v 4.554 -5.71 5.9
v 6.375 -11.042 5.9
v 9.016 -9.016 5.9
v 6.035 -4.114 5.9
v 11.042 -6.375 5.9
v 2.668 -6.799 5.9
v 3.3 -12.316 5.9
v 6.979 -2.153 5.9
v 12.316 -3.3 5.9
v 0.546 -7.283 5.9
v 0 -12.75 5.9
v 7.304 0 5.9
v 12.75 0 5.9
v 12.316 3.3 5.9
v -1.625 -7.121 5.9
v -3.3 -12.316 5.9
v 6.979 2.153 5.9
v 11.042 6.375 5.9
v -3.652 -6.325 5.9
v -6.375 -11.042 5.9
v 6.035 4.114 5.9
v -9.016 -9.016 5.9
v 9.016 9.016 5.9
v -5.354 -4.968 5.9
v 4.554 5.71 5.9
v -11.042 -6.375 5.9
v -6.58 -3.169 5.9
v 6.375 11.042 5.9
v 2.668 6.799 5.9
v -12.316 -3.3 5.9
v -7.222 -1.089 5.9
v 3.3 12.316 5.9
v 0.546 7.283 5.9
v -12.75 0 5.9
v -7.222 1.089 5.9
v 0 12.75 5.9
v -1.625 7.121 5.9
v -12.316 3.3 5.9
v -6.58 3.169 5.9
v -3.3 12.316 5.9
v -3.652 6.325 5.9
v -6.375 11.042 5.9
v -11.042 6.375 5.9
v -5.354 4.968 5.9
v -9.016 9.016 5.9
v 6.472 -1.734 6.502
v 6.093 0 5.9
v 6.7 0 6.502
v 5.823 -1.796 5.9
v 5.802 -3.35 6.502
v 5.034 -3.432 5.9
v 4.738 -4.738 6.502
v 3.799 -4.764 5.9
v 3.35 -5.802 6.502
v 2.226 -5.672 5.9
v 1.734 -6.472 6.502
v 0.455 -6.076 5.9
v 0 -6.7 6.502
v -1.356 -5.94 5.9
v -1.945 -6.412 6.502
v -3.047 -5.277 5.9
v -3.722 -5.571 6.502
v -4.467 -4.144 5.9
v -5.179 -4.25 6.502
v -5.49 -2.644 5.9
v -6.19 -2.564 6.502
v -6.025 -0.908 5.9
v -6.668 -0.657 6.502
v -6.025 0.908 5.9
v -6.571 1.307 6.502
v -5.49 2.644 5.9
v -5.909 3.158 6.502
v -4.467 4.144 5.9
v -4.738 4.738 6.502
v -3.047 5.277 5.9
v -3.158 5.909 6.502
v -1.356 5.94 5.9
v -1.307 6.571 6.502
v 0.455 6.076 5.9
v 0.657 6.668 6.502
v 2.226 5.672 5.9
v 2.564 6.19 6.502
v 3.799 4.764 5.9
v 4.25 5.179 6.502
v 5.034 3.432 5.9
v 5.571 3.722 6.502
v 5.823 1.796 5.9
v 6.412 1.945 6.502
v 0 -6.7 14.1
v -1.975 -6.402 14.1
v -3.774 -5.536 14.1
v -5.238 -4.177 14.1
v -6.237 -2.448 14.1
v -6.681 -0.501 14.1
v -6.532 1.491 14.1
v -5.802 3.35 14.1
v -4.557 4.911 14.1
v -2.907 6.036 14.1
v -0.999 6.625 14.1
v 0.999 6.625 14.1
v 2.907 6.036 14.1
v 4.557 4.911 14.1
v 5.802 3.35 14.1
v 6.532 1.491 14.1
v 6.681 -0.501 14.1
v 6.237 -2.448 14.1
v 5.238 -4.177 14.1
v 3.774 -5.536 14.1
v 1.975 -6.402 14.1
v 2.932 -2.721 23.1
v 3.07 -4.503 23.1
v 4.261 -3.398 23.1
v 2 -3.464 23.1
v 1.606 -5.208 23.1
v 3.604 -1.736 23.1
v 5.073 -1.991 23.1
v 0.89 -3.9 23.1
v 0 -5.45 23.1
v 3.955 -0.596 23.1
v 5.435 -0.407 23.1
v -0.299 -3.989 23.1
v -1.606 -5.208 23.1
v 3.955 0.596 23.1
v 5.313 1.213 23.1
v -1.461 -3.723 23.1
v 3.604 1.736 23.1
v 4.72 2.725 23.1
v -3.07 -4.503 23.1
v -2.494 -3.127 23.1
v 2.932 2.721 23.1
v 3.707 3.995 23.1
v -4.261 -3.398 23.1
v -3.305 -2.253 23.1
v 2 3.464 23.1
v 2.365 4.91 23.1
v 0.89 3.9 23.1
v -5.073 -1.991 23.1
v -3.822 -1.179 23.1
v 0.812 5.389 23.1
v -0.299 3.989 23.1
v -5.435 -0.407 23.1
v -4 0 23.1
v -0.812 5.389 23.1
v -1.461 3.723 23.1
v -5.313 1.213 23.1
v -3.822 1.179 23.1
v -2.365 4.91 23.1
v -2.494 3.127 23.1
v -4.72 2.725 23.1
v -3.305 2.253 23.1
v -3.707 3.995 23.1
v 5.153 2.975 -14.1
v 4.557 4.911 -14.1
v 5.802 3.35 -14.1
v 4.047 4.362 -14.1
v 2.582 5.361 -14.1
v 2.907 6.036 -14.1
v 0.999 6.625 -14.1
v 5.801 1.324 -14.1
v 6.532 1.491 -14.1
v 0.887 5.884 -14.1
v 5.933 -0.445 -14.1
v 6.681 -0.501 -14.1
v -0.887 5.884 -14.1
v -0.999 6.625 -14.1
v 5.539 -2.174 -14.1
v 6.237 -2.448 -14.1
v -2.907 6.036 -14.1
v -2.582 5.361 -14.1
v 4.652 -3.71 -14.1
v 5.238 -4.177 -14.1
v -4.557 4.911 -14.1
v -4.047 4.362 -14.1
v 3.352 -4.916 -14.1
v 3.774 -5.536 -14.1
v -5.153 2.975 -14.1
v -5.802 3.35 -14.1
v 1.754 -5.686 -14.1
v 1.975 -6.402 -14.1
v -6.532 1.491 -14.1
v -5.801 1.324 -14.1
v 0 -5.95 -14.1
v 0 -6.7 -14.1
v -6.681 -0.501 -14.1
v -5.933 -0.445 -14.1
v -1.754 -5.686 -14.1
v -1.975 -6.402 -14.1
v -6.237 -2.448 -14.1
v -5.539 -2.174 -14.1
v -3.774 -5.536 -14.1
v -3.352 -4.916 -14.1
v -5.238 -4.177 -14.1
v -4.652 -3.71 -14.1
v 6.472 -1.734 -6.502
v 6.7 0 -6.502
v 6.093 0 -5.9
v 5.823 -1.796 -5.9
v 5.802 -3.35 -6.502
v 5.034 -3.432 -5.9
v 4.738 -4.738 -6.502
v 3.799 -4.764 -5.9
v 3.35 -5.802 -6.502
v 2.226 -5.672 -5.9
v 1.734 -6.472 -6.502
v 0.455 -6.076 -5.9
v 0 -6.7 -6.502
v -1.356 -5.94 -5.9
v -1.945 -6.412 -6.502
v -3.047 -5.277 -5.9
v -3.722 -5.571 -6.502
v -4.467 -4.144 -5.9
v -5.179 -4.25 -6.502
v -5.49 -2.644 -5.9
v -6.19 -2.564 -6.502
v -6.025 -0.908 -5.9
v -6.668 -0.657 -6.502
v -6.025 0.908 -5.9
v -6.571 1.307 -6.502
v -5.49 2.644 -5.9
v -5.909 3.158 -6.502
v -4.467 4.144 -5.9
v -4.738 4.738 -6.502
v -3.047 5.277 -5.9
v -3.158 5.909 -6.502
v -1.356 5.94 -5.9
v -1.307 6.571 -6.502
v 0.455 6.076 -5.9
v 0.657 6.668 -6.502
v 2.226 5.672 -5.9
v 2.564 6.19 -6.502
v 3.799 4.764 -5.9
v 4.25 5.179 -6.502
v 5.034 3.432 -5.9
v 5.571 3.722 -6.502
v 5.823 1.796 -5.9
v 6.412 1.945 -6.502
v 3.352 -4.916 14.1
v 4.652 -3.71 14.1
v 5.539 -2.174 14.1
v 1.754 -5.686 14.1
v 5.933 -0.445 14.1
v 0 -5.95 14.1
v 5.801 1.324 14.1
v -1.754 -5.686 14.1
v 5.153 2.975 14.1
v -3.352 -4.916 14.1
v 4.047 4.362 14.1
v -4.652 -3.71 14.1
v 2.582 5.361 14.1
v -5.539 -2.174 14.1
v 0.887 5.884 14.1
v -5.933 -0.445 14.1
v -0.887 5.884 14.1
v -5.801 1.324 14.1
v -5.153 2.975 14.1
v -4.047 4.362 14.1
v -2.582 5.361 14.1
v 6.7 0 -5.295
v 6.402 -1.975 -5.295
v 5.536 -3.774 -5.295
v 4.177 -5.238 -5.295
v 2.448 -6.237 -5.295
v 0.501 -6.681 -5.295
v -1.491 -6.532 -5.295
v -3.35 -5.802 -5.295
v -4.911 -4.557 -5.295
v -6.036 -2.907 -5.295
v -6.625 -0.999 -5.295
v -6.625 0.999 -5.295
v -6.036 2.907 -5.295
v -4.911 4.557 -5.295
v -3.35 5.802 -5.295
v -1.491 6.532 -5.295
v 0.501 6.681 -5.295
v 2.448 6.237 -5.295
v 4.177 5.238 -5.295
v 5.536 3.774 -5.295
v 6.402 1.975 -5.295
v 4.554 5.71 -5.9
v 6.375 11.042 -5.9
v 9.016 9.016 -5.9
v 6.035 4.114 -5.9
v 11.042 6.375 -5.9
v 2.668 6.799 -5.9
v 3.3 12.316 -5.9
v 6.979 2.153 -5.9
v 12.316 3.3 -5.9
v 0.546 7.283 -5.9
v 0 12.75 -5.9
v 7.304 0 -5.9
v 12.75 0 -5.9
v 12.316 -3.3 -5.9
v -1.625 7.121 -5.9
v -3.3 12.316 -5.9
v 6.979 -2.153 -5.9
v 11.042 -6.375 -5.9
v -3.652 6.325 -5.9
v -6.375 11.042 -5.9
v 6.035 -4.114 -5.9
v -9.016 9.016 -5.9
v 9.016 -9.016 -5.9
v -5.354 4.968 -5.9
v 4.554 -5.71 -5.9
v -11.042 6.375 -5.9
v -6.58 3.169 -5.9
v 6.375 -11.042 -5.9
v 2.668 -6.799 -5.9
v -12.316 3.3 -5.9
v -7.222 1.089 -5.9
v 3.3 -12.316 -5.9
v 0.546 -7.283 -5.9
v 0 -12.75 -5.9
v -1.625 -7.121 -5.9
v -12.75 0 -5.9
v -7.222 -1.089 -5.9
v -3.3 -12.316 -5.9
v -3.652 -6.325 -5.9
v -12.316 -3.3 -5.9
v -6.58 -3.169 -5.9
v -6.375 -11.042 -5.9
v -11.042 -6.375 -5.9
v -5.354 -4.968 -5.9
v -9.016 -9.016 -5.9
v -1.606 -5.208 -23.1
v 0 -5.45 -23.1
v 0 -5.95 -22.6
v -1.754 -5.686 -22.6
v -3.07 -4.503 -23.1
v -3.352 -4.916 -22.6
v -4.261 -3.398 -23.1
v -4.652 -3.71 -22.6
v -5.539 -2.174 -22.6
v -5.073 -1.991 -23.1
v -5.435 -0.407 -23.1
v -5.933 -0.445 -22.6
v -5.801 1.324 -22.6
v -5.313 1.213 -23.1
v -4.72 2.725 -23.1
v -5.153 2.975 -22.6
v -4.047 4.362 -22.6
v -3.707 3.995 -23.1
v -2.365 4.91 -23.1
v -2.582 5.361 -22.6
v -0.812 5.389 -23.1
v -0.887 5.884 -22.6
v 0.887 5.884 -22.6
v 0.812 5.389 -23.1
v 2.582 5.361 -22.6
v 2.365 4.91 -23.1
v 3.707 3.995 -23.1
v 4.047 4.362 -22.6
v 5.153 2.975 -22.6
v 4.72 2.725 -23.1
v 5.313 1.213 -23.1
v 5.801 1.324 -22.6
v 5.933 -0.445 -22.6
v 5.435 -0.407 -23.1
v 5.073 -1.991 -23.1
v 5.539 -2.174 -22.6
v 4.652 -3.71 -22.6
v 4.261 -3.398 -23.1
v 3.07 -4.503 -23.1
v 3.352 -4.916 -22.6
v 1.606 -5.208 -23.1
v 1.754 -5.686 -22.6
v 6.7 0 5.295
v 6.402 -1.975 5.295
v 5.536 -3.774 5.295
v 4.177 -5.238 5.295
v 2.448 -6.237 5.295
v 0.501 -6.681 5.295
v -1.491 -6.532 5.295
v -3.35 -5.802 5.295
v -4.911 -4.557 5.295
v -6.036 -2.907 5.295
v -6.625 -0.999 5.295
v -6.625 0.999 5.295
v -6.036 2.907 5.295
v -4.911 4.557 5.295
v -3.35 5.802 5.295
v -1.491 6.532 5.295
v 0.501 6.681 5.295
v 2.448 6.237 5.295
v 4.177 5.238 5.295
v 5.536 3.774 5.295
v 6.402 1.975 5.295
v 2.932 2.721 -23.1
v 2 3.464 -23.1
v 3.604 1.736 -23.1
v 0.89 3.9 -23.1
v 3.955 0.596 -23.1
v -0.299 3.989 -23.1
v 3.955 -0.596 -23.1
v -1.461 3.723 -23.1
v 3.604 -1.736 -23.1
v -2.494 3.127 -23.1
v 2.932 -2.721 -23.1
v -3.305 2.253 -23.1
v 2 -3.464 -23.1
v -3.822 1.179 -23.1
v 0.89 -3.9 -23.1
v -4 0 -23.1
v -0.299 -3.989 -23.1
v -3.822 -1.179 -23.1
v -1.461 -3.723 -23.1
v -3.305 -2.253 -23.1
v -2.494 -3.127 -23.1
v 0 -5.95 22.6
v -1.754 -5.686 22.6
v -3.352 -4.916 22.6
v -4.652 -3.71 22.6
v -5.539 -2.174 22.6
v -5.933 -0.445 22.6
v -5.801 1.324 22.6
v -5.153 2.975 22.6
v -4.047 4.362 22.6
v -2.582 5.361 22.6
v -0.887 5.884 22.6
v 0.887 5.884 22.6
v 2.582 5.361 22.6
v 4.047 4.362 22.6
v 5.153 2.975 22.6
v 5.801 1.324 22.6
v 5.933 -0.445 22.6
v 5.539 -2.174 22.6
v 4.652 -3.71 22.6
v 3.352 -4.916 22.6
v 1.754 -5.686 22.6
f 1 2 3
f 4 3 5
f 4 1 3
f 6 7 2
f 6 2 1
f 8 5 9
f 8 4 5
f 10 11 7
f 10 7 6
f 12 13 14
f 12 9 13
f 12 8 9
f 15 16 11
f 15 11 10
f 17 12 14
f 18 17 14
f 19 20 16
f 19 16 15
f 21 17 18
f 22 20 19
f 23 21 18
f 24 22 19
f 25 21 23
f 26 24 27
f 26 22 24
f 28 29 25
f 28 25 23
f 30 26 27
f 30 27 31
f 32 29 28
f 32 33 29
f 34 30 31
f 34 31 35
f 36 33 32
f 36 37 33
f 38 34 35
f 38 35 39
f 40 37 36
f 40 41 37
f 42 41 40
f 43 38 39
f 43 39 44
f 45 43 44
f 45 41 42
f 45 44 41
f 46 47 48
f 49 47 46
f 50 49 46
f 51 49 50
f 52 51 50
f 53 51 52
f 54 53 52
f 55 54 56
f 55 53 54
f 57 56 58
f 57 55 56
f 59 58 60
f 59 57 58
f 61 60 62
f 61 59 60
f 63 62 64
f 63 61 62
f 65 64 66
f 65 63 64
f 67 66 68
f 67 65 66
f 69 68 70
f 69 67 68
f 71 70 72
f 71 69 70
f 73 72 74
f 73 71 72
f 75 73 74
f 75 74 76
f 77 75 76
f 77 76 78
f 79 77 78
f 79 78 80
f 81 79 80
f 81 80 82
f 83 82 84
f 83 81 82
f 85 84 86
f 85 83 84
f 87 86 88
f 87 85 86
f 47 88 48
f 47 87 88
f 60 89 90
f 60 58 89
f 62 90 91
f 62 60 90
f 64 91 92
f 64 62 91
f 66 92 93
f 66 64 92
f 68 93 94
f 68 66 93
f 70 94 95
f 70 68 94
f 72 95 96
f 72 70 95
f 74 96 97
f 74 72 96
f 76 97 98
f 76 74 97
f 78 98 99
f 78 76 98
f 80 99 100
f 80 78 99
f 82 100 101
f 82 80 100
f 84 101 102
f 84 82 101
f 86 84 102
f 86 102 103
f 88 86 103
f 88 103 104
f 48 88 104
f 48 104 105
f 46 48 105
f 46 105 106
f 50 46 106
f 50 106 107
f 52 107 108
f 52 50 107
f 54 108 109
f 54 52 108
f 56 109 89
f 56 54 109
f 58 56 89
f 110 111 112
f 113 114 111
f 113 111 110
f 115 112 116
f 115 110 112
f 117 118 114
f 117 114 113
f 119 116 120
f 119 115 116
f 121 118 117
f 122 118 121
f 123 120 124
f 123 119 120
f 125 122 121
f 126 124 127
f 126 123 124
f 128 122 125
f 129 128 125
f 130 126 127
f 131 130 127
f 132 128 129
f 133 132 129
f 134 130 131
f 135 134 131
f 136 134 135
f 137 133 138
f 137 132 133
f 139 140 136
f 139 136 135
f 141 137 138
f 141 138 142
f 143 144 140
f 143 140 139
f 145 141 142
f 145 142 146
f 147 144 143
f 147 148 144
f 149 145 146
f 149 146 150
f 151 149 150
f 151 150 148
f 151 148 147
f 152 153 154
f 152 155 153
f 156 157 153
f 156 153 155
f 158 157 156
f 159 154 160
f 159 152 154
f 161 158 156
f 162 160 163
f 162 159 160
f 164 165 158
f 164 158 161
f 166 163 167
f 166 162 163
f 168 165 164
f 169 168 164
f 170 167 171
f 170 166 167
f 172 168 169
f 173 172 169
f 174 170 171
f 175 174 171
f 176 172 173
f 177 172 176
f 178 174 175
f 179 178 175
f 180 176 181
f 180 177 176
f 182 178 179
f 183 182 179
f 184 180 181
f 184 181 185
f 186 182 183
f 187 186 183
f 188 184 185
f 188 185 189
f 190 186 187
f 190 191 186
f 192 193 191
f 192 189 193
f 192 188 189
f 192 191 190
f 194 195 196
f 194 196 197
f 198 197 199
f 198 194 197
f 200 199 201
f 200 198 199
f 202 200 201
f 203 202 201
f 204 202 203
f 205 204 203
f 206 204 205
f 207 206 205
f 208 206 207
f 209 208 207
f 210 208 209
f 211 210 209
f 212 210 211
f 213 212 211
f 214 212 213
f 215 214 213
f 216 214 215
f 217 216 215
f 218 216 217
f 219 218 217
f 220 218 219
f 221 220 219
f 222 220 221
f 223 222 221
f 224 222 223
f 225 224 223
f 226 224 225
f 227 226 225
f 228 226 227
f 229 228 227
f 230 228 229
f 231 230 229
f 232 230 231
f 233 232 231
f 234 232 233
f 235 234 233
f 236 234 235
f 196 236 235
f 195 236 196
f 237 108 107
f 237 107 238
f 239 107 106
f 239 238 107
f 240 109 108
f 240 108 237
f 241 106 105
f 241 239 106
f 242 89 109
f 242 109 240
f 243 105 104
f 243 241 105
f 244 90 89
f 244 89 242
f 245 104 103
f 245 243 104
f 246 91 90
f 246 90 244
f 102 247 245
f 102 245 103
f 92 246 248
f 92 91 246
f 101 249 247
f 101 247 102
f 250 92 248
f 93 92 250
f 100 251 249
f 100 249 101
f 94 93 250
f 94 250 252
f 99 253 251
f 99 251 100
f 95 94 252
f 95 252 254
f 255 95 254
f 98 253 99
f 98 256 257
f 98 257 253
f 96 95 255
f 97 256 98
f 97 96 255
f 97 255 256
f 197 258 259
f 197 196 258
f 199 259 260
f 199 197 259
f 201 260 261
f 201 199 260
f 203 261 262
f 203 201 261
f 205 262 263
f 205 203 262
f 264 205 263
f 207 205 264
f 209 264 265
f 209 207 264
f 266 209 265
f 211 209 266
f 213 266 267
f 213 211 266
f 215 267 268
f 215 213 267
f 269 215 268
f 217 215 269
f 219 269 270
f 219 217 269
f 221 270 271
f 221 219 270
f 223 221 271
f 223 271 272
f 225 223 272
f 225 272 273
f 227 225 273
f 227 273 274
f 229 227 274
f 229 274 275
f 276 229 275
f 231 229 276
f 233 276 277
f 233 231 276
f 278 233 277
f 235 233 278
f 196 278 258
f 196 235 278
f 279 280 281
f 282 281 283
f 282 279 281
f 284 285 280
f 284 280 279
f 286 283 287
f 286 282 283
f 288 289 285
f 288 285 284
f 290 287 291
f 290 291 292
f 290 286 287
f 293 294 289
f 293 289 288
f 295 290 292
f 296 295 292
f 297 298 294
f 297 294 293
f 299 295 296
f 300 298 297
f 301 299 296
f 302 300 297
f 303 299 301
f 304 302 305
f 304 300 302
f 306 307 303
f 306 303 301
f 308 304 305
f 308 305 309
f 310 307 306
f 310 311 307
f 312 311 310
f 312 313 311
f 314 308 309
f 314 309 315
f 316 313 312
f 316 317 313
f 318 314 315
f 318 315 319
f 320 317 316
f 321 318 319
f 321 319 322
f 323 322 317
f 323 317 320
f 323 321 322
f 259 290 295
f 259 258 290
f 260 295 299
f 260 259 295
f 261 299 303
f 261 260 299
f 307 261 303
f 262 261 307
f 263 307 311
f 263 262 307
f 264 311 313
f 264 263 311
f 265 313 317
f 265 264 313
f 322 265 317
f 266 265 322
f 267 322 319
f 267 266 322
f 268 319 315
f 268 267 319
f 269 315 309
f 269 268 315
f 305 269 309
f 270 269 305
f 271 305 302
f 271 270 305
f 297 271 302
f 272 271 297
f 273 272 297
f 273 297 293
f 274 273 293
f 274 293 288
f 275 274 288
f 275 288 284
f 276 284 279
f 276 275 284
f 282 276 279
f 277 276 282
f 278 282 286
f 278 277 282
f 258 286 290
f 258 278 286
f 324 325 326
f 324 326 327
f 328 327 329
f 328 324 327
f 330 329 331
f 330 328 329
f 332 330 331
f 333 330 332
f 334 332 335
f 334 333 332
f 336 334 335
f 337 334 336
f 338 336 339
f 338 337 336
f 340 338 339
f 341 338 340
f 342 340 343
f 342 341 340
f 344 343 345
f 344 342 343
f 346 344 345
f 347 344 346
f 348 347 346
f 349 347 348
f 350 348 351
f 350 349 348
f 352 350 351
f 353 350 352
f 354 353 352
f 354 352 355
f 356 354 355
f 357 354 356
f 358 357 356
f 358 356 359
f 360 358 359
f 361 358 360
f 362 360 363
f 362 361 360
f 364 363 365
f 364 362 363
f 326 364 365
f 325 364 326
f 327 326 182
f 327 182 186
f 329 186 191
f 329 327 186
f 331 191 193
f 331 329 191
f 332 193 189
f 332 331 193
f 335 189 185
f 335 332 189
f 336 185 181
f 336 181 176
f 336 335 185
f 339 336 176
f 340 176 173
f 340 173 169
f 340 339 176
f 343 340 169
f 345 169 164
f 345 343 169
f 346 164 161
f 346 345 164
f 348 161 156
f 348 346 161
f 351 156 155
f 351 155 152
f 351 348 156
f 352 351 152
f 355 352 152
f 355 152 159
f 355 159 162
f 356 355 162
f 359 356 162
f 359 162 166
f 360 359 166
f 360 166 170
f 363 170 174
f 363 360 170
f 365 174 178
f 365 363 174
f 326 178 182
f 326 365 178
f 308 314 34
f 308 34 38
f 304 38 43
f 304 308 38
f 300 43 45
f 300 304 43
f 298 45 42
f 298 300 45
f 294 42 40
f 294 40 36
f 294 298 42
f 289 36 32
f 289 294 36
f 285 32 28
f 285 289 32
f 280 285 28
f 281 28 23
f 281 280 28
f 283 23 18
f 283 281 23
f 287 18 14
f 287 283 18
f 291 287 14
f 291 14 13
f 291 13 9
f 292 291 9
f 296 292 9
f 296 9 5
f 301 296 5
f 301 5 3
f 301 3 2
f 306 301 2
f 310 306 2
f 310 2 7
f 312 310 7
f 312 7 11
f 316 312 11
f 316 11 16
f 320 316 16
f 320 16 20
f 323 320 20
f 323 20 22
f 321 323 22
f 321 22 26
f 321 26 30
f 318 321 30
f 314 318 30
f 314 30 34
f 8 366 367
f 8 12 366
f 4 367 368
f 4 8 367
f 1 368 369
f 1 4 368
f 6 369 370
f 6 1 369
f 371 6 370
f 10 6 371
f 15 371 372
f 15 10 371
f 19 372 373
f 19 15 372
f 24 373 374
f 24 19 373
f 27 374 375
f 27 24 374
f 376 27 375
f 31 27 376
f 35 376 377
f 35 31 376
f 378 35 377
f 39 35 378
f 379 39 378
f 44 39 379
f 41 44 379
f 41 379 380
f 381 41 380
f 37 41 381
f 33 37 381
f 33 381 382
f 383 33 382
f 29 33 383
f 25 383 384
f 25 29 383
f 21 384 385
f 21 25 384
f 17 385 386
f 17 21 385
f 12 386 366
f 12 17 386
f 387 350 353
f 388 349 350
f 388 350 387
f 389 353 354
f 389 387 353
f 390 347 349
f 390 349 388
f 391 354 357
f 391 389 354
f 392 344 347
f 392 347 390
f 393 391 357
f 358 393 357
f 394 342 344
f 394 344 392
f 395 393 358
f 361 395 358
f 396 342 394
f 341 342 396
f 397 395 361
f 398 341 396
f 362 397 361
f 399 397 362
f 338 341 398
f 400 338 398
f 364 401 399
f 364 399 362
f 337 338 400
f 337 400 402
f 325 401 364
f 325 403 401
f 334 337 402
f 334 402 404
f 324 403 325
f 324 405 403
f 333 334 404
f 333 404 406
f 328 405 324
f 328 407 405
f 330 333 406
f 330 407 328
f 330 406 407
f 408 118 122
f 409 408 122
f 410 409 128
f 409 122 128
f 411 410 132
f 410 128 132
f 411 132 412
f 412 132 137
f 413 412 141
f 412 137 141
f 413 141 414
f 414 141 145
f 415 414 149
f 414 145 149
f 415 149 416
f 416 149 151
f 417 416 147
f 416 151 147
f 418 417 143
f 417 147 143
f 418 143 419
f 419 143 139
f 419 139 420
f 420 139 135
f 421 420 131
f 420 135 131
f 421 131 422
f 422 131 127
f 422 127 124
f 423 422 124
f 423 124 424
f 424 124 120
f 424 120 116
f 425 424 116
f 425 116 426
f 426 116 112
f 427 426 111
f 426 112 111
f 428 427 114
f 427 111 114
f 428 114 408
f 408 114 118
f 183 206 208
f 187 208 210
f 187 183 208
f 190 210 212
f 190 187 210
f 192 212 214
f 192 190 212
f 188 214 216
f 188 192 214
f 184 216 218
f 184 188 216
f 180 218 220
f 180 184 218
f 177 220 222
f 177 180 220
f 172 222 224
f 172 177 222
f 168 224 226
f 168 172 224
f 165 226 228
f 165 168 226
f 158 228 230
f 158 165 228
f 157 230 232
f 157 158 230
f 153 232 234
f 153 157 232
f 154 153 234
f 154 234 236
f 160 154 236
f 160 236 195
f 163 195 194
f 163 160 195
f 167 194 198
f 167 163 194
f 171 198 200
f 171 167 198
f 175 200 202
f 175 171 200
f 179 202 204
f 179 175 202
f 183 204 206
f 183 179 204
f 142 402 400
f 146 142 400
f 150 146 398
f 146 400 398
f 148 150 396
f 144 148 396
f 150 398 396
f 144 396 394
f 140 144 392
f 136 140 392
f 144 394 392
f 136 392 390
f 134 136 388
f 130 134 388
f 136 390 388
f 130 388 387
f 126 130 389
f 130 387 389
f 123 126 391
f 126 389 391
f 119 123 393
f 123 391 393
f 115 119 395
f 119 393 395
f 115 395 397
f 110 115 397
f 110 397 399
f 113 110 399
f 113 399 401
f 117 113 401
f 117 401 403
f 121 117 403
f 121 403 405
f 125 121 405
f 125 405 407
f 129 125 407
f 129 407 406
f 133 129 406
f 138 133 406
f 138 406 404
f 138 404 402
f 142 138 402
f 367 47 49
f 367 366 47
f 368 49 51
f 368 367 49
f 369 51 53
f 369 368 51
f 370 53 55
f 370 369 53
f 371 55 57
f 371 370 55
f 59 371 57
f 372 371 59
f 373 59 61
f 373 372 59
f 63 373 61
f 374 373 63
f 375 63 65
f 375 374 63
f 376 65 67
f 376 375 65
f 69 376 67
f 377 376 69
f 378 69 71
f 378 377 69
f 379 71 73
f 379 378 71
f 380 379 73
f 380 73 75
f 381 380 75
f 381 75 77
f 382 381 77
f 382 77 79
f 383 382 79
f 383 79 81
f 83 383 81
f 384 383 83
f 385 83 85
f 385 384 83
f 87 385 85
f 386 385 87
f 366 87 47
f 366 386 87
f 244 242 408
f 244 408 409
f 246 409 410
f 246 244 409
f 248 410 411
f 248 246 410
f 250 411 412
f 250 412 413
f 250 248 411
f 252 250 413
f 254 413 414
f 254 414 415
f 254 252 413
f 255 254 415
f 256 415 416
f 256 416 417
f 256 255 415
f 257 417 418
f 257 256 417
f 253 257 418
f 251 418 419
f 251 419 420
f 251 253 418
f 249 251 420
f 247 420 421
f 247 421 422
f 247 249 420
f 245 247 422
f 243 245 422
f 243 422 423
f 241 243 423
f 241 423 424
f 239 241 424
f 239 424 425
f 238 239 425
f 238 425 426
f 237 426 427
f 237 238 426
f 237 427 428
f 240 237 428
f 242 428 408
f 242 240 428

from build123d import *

# Parameters (mm, degrees)
SKETCH_2_R          = 1.5
CUT_EXTRUDE_1_DEPTH = 36.114099732
SKETCH_4_R          = 14
SKETCH_4_R_2        = 12.75
CUT_EXTRUDE_4_DEPTH = 36.114099732
CUT_EXTRUDE_5_DEPTH = 35.148572445
SKETCH_6_R          = 4
CUT_EXTRUDE_6_DEPTH = 50.594001653
SKETCH_7_R          = 12.75
SKETCH_7_R_2        = 6.7
EXTRUDE_1_DEPTH     = 11.8
CHAMFER_1_SIZE      = 0.5


with BuildPart() as part:
    # 草图1 → 旋转1 (revolve)
    with BuildSketch(Plane(origin=(0, 0, 0), x_dir=(0, 0, -1), z_dir=(1, 0, 0)), mode=Mode.PRIVATE) as revolve_1_sk:
        Polygon((-23.1, 0), (-23.1, 5.95), (-14.1, 5.95), (-14.1, 6.7), (-5.9, 6.7), (-5.9, 14), (5.9, 14), (5.9, 6.7), (14.1, 6.7), (14.1, 5.95), (23.1, 5.95), (23.1, 0), align=None)
    revolve(revolve_1_sk.sketch.rotate(Axis((0, 0, 23.1), (0, 0, -1)), 180), axis=Axis((0, 0, 23.1), (0, 0, -1)))

    # 草图2 → 切除-拉伸1 (cut, through all)
    with BuildSketch(Plane.XY.offset(5.9)):
        with Locations((0, 10.5)):
            Circle(SKETCH_2_R)
        with Locations((10.5, 0)):
            Circle(SKETCH_2_R)
        with Locations((0, -10.5)):
            Circle(SKETCH_2_R)
        with Locations((-10.5, 0)):
            Circle(SKETCH_2_R)
    extrude(amount=-CUT_EXTRUDE_1_DEPTH, mode=Mode.SUBTRACT)

    # 草图4 → 切除-拉伸4 (cut, through all)
    with BuildSketch(Plane(origin=(0, 0, -5.9), x_dir=(-1, 0, 0), z_dir=(0, 0, -1))):
        Circle(SKETCH_4_R)
        Circle(SKETCH_4_R_2, mode=Mode.SUBTRACT)
    extrude(amount=-CUT_EXTRUDE_4_DEPTH, mode=Mode.SUBTRACT)

    # 草图5 → 切除-拉伸5 (cut, through all)
    with BuildSketch(Plane(origin=(0, 0, -5.9), x_dir=(-1, 0, 0), z_dir=(0, 0, -1))):
        with BuildLine():
            Line((-9.26871571, 3.618136135), (-8.331955809, 3.252462513))
            ThreePointArc((-8.331955809, 3.252462513), (-7.618330669, 3.247249598), (-7.082950618, 3.719114215))
            ThreePointArc((-7.082950618, 3.719114215), (-5.656854249, 5.656854249), (-3.719114215, 7.082950618))
            ThreePointArc((-3.719114215, 7.082950618), (-3.247249598, 7.618330669), (-3.252462513, 8.331955809))
            Line((-3.252462513, 8.331955809), (-3.618136135, 9.26871571))
            ThreePointArc((-3.618136135, 9.26871571), (-4.194460373, 9.839863314), (-5.004644825, 9.795587281))
            ThreePointArc((-5.004644825, 9.795587281), (-7.778174593, 7.778174593), (-9.795587281, 5.004644825))
            ThreePointArc((-9.795587281, 5.004644825), (-9.839863314, 4.194460373), (-9.26871571, 3.618136135))
        make_face()
        with BuildLine():
            Line((3.618136135, 9.26871571), (3.252462513, 8.331955809))
            ThreePointArc((3.252462513, 8.331955809), (3.247249598, 7.618330669), (3.719114215, 7.082950618))
            ThreePointArc((3.719114215, 7.082950618), (5.656854249, 5.656854249), (7.082950618, 3.719114215))
            ThreePointArc((7.082950618, 3.719114215), (7.618330669, 3.247249598), (8.331955809, 3.252462513))
            Line((8.331955809, 3.252462513), (9.26871571, 3.618136135))
            ThreePointArc((9.26871571, 3.618136135), (9.839863314, 4.194460373), (9.795587281, 5.004644825))
            ThreePointArc((9.795587281, 5.004644825), (7.778174593, 7.778174593), (5.004644825, 9.795587281))
            ThreePointArc((5.004644825, 9.795587281), (4.194460373, 9.839863314), (3.618136135, 9.26871571))
        make_face()
        with BuildLine():
            Line((9.26871571, -3.618136135), (8.331955809, -3.252462513))
            ThreePointArc((8.331955809, -3.252462513), (7.618330669, -3.247249598), (7.082950618, -3.719114215))
            ThreePointArc((7.082950618, -3.719114215), (5.656854249, -5.656854249), (3.719114215, -7.082950618))
            ThreePointArc((3.719114215, -7.082950618), (3.247249598, -7.618330669), (3.252462513, -8.331955809))
            Line((3.252462513, -8.331955809), (3.618136135, -9.26871571))
            ThreePointArc((3.618136135, -9.26871571), (4.194460373, -9.839863314), (5.004644825, -9.795587281))
            ThreePointArc((5.004644825, -9.795587281), (7.778174593, -7.778174593), (9.795587281, -5.004644825))
            ThreePointArc((9.795587281, -5.004644825), (9.839863314, -4.194460373), (9.26871571, -3.618136135))
        make_face()
        with BuildLine():
            Line((-3.618136135, -9.26871571), (-3.252462513, -8.331955809))
            ThreePointArc((-3.252462513, -8.331955809), (-3.247249598, -7.618330669), (-3.719114215, -7.082950618))
            ThreePointArc((-3.719114215, -7.082950618), (-5.656854249, -5.656854249), (-7.082950618, -3.719114215))
            ThreePointArc((-7.082950618, -3.719114215), (-7.618330669, -3.247249598), (-8.331955809, -3.252462513))
            Line((-8.331955809, -3.252462513), (-9.26871571, -3.618136135))
            ThreePointArc((-9.26871571, -3.618136135), (-9.839863314, -4.194460373), (-9.795587281, -5.004644825))
            ThreePointArc((-9.795587281, -5.004644825), (-7.778174593, -7.778174593), (-5.004644825, -9.795587281))
            ThreePointArc((-5.004644825, -9.795587281), (-4.194460373, -9.839863314), (-3.618136135, -9.26871571))
        make_face()
    extrude(amount=-CUT_EXTRUDE_5_DEPTH, mode=Mode.SUBTRACT)

    # 草图6 → 切除-拉伸6 (cut, through all)
    with BuildSketch(Plane(origin=(0, 0, -23.1), x_dir=(-1, 0, 0), z_dir=(0, 0, -1))):
        Circle(SKETCH_6_R)
    extrude(amount=-CUT_EXTRUDE_6_DEPTH, mode=Mode.SUBTRACT)

    # 草图7 → 凸台-拉伸1 (add)
    with BuildSketch(Plane(origin=(0, 0, -5.9), x_dir=(-1, 0, 0), z_dir=(0, 0, -1))):
        Circle(SKETCH_7_R)
        with Locations(Location((0, 0, 0), (0, 0, 270))):
            Circle(SKETCH_7_R_2, mode=Mode.SUBTRACT)
    extrude(amount=-EXTRUDE_1_DEPTH)

    # 草图8 → 切除-旋转1 (revolve, cut)
    with BuildSketch(Plane(origin=(0, 0, 0), x_dir=(0, 0, -1), z_dir=(1, 0, 0)), mode=Mode.PRIVATE) as cut_revolve_1_sk:
        Polygon((-6.502145005, 6.7), (-5.9, 6.093231234), (-5.294771168, 6.7), (-5.9, 7.303692806), align=None)
        Polygon((6.502145005, 6.7), (5.9, 7.303692806), (5.294771168, 6.7), (5.9, 6.093231234), align=None)
    revolve(cut_revolve_1_sk.sketch.rotate(Axis((0, 0, 0), (0, 0, -1)), 90), axis=Axis((0, 0, 0), (0, 0, -1)), mode=Mode.SUBTRACT)

    # 倒角1
    chamfer_1_edges = [part.edges().sort_by_distance(p)[0] for p in [
        (0, 5.95, -23.1),
        (0, 5.95, 23.1),
    ]]
    chamfer(chamfer_1_edges, length=CHAMFER_1_SIZE)


solid = part.part
